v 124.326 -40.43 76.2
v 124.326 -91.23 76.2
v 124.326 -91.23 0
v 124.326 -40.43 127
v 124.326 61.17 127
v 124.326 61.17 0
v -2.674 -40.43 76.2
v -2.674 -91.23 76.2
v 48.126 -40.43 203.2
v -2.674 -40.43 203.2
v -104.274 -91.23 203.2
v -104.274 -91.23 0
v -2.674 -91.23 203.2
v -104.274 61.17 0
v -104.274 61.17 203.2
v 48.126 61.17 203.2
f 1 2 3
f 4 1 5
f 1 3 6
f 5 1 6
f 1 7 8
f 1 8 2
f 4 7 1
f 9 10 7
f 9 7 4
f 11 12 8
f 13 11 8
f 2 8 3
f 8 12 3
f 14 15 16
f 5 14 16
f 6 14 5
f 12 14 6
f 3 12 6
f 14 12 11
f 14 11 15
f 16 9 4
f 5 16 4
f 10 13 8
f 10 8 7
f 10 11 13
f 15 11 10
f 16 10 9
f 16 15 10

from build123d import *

# Parameters (mm, degrees)
F0_W     = 228.6
F0_H     = 152.4
F1_DEPTH = 203.2
F2_W     = 127
F2_H     = 50.8
F3_DEPTH = 127
F5_DEPTH = 101.6


# Not quite as in the source:
# - a feature names something its author has since deleted; it is built from what else it names


with BuildPart() as f1:
    # F0 (on Top) → F1 (new body)
    with BuildSketch(Plane.XY):
        with Locations((10.0263133645, -15.0303587328)):
            Rectangle(F0_W, F0_H)
    extrude(amount=F1_DEPTH)

    # F2 (on face) → F3 (cut)
    with BuildSketch(Plane.XY.offset(203.2)):
        with Locations((60.8263133645, -65.8303587328)):
            Rectangle(F2_W, F2_H)
    extrude(amount=-F3_DEPTH, mode=Mode.SUBTRACT)

    # F4 (on face) → F5 (cut)
    with BuildSketch(Plane.XZ.offset(40.4303587328)):
        Polygon((124.3263133645, 203.2), (48.1263133645, 203.2), (124.3263133645, 127), align=None)
    extrude(amount=-F5_DEPTH, mode=Mode.SUBTRACT)


solid = f1.part
